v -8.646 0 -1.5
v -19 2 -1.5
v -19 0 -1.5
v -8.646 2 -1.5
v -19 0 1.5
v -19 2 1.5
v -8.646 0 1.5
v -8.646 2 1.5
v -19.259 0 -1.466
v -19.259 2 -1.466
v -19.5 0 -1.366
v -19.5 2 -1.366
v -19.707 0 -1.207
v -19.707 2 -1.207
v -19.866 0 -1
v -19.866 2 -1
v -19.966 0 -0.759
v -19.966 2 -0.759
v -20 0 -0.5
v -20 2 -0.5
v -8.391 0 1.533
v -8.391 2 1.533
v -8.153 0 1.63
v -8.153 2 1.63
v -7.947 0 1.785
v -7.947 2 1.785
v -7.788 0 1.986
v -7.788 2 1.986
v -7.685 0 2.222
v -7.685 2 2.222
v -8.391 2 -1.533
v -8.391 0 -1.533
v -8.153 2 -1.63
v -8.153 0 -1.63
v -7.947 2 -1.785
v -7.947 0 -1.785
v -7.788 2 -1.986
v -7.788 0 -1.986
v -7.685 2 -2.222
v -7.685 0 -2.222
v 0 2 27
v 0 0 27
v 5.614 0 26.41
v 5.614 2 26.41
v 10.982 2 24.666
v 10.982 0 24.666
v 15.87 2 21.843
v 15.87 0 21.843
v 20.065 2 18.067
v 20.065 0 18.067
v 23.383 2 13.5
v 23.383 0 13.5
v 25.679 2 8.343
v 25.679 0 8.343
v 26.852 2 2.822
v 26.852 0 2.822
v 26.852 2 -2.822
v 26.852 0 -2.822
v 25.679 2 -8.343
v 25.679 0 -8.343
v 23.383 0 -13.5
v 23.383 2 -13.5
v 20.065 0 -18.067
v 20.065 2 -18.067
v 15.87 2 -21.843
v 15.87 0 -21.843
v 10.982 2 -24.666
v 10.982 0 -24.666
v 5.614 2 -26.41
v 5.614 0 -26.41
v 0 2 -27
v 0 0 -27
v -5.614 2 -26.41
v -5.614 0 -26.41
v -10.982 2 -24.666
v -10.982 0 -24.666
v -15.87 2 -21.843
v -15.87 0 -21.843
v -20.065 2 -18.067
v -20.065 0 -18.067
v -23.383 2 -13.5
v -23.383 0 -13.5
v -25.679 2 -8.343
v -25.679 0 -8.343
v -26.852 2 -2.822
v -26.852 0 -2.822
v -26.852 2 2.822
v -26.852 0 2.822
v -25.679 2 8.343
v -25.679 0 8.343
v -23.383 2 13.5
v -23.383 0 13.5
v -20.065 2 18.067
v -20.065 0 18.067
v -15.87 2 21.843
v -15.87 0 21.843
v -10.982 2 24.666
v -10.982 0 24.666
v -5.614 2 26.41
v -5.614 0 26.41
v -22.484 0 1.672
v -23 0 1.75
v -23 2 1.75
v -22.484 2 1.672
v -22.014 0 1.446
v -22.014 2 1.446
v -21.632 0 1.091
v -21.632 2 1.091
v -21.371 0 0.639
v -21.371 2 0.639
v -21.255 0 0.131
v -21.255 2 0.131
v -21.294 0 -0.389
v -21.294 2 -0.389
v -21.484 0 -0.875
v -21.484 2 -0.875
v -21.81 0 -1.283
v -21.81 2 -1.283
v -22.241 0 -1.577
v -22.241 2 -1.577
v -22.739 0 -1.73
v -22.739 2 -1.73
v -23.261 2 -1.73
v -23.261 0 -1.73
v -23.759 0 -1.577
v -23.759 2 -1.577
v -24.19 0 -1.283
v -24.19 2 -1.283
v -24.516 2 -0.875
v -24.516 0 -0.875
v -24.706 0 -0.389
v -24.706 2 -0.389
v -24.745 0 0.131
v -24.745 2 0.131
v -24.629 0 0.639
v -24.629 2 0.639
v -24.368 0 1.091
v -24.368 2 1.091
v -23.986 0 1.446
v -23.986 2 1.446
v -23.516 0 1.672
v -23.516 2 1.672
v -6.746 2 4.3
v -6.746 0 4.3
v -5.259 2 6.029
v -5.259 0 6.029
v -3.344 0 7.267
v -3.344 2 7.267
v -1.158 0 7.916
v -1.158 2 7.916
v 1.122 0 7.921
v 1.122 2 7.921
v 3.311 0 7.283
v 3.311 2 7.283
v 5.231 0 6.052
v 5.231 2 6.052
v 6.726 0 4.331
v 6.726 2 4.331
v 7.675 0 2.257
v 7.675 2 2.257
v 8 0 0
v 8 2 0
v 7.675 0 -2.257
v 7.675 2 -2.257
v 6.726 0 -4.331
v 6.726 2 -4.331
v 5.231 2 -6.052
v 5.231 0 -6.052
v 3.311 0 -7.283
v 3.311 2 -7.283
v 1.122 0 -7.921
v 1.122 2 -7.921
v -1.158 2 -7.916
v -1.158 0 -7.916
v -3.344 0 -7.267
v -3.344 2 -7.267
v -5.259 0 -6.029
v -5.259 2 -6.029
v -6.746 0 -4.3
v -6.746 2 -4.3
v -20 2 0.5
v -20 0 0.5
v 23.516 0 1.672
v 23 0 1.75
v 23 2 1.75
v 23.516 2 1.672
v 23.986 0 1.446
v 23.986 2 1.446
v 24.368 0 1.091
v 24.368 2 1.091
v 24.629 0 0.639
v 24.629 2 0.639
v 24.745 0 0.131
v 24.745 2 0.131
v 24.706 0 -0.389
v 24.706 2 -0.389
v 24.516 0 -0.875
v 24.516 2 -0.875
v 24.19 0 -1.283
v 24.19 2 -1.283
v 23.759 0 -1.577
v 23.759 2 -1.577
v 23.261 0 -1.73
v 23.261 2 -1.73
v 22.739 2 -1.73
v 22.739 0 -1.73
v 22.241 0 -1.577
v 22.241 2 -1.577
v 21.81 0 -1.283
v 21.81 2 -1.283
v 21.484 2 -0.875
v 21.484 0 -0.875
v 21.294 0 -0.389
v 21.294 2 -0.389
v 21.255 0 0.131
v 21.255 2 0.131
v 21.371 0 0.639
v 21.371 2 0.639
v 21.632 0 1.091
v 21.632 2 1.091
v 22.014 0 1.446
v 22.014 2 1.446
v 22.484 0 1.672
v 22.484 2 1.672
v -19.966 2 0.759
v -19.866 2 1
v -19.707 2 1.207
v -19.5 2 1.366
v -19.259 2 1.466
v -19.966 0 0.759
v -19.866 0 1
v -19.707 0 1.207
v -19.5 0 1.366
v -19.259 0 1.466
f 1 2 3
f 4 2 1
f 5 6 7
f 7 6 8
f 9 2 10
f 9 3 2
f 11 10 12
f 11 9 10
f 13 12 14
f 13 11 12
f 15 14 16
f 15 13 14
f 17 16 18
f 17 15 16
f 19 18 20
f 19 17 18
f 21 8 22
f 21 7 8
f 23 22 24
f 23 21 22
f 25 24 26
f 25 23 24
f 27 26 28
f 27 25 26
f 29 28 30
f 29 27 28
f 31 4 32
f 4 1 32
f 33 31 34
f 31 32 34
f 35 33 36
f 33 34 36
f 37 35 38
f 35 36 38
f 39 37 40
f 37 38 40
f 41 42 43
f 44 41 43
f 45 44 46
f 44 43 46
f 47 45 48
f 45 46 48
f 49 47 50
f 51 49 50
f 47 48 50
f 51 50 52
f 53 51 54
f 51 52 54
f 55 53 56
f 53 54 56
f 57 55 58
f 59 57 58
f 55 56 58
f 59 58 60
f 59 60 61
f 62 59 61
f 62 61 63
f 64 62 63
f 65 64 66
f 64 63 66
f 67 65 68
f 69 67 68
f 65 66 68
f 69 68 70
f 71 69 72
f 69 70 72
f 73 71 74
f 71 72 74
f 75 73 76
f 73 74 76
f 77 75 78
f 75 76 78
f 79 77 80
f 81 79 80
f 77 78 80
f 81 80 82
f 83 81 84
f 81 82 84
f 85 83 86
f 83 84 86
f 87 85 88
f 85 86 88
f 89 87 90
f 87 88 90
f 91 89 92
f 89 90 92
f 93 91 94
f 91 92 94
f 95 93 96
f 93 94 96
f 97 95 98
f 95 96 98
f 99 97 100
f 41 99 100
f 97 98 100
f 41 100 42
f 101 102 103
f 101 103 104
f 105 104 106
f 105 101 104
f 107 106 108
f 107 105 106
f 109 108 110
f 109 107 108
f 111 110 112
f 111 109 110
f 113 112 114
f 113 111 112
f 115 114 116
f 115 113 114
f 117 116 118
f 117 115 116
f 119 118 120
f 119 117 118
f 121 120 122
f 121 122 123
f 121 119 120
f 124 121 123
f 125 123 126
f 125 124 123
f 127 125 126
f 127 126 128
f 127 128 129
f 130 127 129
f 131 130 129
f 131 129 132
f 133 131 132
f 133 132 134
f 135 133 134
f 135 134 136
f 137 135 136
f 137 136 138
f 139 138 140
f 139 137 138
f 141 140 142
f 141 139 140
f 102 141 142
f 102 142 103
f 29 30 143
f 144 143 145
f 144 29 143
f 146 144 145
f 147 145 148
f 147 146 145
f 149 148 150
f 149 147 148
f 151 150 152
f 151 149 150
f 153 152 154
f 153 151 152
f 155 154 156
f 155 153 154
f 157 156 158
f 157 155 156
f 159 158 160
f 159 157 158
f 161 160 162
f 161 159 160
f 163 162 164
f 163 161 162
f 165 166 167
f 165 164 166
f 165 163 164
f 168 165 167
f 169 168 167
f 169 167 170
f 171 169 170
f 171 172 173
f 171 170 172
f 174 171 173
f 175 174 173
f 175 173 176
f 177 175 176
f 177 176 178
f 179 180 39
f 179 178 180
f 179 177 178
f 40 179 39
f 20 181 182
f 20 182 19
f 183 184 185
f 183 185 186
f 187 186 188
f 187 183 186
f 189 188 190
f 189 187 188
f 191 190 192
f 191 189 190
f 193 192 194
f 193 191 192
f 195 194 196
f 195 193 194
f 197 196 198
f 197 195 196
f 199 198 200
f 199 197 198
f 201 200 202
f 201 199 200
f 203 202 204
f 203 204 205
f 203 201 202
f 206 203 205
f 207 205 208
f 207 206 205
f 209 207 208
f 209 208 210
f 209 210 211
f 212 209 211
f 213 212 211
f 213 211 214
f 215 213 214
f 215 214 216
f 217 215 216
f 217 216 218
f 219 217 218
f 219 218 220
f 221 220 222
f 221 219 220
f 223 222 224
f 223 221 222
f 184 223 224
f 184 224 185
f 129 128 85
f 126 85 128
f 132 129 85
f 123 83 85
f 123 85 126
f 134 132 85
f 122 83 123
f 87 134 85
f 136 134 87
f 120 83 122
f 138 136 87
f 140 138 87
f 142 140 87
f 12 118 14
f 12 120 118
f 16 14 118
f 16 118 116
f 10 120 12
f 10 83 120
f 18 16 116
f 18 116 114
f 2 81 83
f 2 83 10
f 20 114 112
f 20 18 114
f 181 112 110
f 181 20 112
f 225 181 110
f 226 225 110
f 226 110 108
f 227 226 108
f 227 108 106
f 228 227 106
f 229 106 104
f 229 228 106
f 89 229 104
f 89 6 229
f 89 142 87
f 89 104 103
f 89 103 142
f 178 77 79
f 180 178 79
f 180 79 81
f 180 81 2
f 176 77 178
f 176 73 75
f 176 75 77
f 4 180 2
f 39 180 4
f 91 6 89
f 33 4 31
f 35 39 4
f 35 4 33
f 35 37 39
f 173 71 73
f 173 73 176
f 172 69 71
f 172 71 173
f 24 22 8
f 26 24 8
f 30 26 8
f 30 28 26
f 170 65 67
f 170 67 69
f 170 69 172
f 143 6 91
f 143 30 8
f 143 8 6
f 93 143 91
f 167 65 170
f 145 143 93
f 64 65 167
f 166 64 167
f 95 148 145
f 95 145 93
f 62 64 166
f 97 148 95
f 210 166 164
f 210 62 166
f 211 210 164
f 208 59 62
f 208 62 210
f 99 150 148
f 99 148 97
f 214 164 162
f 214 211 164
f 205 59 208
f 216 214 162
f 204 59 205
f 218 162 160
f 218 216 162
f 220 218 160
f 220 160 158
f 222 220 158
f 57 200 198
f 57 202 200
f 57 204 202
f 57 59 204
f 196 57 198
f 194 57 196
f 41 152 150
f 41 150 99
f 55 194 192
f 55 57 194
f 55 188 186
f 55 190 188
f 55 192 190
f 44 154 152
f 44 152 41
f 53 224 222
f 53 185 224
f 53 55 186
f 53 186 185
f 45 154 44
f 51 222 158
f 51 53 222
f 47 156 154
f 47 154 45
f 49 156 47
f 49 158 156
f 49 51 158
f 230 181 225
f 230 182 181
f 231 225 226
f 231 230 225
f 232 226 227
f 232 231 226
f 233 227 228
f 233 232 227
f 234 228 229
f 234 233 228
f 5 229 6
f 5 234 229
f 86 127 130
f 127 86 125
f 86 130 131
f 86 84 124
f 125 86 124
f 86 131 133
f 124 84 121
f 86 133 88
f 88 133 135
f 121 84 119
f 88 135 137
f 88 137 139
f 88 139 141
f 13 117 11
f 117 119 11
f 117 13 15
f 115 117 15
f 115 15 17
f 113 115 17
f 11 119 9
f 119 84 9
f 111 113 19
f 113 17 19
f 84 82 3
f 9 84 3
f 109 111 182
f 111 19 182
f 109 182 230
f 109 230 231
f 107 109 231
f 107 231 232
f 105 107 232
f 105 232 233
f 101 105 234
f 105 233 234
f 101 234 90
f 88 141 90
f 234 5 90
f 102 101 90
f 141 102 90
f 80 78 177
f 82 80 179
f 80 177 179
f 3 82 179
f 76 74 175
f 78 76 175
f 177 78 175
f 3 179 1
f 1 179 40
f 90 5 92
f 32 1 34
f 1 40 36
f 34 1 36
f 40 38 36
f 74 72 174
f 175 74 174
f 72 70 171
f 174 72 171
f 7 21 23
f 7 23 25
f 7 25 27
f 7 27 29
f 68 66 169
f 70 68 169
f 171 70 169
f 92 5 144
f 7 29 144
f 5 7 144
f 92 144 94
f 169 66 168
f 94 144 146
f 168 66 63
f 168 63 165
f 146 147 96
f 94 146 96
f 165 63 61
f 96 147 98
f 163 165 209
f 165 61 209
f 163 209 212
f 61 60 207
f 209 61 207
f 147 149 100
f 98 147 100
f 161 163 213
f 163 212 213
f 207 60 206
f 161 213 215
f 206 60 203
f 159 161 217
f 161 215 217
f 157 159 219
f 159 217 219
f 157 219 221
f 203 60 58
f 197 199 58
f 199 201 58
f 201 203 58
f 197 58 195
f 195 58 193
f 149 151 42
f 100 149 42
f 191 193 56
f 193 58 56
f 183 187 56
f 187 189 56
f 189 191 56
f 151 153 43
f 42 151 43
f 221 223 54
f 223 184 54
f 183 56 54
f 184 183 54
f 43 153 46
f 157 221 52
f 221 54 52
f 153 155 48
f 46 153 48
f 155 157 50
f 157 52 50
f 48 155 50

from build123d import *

# Parameters (mm, degrees)
SKETCH1_R           = 27
SKETCH1_R_2         = 8
SKETCH1_R_3         = 1.75
BOSS_EXTRUDE1_DEPTH = 2
SKETCH2_W           = 15
SKETCH2_H           = 3
CUT_EXTRUDE1_DEPTH  = 39.236108589
FILLET1_R           = 1


with BuildPart() as part:
    # Sketch1 → Boss-Extrude1 (new body)
    with BuildSketch(Plane(origin=(0, 0, 0), x_dir=(1, 0, 0), z_dir=(0, 1, 0))):
        with Locations(Location((0, 0, 0), (0, 0, 270))):
            Circle(SKETCH1_R)
        with Locations(Location((0, 0, 0), (0, 0, 270))):
            Circle(SKETCH1_R_2, mode=Mode.SUBTRACT)
        with Locations(Location((-23, 0, 0), (0, 0, 270))):
            Circle(SKETCH1_R_3, mode=Mode.SUBTRACT)
        with Locations(Location((23, 0, 0), (0, 0, 270))):
            Circle(SKETCH1_R_3, mode=Mode.SUBTRACT)
    extrude(amount=BOSS_EXTRUDE1_DEPTH)

    # Sketch2 → Cut-Extrude1 (cut, through all)
    with BuildSketch(Plane(origin=(0, 2, 0), x_dir=(1, 0, 0), z_dir=(0, 1, 0))):
        with Locations((-12.5, 0)):
            Rectangle(SKETCH2_W, SKETCH2_H)
    extrude(amount=-CUT_EXTRUDE1_DEPTH, mode=Mode.SUBTRACT)

    # Fillet1
    fillet1_edges = [part.edges().sort_by_distance(p)[0] for p in [
        (-7.858116823, 1, 1.5),
        (-7.858116823, 1, -1.5),
        (-20, 1, 1.5),
        (-20, 1, -1.5),
    ]]
    fillet(fillet1_edges, radius=FILLET1_R)


solid = part.part
